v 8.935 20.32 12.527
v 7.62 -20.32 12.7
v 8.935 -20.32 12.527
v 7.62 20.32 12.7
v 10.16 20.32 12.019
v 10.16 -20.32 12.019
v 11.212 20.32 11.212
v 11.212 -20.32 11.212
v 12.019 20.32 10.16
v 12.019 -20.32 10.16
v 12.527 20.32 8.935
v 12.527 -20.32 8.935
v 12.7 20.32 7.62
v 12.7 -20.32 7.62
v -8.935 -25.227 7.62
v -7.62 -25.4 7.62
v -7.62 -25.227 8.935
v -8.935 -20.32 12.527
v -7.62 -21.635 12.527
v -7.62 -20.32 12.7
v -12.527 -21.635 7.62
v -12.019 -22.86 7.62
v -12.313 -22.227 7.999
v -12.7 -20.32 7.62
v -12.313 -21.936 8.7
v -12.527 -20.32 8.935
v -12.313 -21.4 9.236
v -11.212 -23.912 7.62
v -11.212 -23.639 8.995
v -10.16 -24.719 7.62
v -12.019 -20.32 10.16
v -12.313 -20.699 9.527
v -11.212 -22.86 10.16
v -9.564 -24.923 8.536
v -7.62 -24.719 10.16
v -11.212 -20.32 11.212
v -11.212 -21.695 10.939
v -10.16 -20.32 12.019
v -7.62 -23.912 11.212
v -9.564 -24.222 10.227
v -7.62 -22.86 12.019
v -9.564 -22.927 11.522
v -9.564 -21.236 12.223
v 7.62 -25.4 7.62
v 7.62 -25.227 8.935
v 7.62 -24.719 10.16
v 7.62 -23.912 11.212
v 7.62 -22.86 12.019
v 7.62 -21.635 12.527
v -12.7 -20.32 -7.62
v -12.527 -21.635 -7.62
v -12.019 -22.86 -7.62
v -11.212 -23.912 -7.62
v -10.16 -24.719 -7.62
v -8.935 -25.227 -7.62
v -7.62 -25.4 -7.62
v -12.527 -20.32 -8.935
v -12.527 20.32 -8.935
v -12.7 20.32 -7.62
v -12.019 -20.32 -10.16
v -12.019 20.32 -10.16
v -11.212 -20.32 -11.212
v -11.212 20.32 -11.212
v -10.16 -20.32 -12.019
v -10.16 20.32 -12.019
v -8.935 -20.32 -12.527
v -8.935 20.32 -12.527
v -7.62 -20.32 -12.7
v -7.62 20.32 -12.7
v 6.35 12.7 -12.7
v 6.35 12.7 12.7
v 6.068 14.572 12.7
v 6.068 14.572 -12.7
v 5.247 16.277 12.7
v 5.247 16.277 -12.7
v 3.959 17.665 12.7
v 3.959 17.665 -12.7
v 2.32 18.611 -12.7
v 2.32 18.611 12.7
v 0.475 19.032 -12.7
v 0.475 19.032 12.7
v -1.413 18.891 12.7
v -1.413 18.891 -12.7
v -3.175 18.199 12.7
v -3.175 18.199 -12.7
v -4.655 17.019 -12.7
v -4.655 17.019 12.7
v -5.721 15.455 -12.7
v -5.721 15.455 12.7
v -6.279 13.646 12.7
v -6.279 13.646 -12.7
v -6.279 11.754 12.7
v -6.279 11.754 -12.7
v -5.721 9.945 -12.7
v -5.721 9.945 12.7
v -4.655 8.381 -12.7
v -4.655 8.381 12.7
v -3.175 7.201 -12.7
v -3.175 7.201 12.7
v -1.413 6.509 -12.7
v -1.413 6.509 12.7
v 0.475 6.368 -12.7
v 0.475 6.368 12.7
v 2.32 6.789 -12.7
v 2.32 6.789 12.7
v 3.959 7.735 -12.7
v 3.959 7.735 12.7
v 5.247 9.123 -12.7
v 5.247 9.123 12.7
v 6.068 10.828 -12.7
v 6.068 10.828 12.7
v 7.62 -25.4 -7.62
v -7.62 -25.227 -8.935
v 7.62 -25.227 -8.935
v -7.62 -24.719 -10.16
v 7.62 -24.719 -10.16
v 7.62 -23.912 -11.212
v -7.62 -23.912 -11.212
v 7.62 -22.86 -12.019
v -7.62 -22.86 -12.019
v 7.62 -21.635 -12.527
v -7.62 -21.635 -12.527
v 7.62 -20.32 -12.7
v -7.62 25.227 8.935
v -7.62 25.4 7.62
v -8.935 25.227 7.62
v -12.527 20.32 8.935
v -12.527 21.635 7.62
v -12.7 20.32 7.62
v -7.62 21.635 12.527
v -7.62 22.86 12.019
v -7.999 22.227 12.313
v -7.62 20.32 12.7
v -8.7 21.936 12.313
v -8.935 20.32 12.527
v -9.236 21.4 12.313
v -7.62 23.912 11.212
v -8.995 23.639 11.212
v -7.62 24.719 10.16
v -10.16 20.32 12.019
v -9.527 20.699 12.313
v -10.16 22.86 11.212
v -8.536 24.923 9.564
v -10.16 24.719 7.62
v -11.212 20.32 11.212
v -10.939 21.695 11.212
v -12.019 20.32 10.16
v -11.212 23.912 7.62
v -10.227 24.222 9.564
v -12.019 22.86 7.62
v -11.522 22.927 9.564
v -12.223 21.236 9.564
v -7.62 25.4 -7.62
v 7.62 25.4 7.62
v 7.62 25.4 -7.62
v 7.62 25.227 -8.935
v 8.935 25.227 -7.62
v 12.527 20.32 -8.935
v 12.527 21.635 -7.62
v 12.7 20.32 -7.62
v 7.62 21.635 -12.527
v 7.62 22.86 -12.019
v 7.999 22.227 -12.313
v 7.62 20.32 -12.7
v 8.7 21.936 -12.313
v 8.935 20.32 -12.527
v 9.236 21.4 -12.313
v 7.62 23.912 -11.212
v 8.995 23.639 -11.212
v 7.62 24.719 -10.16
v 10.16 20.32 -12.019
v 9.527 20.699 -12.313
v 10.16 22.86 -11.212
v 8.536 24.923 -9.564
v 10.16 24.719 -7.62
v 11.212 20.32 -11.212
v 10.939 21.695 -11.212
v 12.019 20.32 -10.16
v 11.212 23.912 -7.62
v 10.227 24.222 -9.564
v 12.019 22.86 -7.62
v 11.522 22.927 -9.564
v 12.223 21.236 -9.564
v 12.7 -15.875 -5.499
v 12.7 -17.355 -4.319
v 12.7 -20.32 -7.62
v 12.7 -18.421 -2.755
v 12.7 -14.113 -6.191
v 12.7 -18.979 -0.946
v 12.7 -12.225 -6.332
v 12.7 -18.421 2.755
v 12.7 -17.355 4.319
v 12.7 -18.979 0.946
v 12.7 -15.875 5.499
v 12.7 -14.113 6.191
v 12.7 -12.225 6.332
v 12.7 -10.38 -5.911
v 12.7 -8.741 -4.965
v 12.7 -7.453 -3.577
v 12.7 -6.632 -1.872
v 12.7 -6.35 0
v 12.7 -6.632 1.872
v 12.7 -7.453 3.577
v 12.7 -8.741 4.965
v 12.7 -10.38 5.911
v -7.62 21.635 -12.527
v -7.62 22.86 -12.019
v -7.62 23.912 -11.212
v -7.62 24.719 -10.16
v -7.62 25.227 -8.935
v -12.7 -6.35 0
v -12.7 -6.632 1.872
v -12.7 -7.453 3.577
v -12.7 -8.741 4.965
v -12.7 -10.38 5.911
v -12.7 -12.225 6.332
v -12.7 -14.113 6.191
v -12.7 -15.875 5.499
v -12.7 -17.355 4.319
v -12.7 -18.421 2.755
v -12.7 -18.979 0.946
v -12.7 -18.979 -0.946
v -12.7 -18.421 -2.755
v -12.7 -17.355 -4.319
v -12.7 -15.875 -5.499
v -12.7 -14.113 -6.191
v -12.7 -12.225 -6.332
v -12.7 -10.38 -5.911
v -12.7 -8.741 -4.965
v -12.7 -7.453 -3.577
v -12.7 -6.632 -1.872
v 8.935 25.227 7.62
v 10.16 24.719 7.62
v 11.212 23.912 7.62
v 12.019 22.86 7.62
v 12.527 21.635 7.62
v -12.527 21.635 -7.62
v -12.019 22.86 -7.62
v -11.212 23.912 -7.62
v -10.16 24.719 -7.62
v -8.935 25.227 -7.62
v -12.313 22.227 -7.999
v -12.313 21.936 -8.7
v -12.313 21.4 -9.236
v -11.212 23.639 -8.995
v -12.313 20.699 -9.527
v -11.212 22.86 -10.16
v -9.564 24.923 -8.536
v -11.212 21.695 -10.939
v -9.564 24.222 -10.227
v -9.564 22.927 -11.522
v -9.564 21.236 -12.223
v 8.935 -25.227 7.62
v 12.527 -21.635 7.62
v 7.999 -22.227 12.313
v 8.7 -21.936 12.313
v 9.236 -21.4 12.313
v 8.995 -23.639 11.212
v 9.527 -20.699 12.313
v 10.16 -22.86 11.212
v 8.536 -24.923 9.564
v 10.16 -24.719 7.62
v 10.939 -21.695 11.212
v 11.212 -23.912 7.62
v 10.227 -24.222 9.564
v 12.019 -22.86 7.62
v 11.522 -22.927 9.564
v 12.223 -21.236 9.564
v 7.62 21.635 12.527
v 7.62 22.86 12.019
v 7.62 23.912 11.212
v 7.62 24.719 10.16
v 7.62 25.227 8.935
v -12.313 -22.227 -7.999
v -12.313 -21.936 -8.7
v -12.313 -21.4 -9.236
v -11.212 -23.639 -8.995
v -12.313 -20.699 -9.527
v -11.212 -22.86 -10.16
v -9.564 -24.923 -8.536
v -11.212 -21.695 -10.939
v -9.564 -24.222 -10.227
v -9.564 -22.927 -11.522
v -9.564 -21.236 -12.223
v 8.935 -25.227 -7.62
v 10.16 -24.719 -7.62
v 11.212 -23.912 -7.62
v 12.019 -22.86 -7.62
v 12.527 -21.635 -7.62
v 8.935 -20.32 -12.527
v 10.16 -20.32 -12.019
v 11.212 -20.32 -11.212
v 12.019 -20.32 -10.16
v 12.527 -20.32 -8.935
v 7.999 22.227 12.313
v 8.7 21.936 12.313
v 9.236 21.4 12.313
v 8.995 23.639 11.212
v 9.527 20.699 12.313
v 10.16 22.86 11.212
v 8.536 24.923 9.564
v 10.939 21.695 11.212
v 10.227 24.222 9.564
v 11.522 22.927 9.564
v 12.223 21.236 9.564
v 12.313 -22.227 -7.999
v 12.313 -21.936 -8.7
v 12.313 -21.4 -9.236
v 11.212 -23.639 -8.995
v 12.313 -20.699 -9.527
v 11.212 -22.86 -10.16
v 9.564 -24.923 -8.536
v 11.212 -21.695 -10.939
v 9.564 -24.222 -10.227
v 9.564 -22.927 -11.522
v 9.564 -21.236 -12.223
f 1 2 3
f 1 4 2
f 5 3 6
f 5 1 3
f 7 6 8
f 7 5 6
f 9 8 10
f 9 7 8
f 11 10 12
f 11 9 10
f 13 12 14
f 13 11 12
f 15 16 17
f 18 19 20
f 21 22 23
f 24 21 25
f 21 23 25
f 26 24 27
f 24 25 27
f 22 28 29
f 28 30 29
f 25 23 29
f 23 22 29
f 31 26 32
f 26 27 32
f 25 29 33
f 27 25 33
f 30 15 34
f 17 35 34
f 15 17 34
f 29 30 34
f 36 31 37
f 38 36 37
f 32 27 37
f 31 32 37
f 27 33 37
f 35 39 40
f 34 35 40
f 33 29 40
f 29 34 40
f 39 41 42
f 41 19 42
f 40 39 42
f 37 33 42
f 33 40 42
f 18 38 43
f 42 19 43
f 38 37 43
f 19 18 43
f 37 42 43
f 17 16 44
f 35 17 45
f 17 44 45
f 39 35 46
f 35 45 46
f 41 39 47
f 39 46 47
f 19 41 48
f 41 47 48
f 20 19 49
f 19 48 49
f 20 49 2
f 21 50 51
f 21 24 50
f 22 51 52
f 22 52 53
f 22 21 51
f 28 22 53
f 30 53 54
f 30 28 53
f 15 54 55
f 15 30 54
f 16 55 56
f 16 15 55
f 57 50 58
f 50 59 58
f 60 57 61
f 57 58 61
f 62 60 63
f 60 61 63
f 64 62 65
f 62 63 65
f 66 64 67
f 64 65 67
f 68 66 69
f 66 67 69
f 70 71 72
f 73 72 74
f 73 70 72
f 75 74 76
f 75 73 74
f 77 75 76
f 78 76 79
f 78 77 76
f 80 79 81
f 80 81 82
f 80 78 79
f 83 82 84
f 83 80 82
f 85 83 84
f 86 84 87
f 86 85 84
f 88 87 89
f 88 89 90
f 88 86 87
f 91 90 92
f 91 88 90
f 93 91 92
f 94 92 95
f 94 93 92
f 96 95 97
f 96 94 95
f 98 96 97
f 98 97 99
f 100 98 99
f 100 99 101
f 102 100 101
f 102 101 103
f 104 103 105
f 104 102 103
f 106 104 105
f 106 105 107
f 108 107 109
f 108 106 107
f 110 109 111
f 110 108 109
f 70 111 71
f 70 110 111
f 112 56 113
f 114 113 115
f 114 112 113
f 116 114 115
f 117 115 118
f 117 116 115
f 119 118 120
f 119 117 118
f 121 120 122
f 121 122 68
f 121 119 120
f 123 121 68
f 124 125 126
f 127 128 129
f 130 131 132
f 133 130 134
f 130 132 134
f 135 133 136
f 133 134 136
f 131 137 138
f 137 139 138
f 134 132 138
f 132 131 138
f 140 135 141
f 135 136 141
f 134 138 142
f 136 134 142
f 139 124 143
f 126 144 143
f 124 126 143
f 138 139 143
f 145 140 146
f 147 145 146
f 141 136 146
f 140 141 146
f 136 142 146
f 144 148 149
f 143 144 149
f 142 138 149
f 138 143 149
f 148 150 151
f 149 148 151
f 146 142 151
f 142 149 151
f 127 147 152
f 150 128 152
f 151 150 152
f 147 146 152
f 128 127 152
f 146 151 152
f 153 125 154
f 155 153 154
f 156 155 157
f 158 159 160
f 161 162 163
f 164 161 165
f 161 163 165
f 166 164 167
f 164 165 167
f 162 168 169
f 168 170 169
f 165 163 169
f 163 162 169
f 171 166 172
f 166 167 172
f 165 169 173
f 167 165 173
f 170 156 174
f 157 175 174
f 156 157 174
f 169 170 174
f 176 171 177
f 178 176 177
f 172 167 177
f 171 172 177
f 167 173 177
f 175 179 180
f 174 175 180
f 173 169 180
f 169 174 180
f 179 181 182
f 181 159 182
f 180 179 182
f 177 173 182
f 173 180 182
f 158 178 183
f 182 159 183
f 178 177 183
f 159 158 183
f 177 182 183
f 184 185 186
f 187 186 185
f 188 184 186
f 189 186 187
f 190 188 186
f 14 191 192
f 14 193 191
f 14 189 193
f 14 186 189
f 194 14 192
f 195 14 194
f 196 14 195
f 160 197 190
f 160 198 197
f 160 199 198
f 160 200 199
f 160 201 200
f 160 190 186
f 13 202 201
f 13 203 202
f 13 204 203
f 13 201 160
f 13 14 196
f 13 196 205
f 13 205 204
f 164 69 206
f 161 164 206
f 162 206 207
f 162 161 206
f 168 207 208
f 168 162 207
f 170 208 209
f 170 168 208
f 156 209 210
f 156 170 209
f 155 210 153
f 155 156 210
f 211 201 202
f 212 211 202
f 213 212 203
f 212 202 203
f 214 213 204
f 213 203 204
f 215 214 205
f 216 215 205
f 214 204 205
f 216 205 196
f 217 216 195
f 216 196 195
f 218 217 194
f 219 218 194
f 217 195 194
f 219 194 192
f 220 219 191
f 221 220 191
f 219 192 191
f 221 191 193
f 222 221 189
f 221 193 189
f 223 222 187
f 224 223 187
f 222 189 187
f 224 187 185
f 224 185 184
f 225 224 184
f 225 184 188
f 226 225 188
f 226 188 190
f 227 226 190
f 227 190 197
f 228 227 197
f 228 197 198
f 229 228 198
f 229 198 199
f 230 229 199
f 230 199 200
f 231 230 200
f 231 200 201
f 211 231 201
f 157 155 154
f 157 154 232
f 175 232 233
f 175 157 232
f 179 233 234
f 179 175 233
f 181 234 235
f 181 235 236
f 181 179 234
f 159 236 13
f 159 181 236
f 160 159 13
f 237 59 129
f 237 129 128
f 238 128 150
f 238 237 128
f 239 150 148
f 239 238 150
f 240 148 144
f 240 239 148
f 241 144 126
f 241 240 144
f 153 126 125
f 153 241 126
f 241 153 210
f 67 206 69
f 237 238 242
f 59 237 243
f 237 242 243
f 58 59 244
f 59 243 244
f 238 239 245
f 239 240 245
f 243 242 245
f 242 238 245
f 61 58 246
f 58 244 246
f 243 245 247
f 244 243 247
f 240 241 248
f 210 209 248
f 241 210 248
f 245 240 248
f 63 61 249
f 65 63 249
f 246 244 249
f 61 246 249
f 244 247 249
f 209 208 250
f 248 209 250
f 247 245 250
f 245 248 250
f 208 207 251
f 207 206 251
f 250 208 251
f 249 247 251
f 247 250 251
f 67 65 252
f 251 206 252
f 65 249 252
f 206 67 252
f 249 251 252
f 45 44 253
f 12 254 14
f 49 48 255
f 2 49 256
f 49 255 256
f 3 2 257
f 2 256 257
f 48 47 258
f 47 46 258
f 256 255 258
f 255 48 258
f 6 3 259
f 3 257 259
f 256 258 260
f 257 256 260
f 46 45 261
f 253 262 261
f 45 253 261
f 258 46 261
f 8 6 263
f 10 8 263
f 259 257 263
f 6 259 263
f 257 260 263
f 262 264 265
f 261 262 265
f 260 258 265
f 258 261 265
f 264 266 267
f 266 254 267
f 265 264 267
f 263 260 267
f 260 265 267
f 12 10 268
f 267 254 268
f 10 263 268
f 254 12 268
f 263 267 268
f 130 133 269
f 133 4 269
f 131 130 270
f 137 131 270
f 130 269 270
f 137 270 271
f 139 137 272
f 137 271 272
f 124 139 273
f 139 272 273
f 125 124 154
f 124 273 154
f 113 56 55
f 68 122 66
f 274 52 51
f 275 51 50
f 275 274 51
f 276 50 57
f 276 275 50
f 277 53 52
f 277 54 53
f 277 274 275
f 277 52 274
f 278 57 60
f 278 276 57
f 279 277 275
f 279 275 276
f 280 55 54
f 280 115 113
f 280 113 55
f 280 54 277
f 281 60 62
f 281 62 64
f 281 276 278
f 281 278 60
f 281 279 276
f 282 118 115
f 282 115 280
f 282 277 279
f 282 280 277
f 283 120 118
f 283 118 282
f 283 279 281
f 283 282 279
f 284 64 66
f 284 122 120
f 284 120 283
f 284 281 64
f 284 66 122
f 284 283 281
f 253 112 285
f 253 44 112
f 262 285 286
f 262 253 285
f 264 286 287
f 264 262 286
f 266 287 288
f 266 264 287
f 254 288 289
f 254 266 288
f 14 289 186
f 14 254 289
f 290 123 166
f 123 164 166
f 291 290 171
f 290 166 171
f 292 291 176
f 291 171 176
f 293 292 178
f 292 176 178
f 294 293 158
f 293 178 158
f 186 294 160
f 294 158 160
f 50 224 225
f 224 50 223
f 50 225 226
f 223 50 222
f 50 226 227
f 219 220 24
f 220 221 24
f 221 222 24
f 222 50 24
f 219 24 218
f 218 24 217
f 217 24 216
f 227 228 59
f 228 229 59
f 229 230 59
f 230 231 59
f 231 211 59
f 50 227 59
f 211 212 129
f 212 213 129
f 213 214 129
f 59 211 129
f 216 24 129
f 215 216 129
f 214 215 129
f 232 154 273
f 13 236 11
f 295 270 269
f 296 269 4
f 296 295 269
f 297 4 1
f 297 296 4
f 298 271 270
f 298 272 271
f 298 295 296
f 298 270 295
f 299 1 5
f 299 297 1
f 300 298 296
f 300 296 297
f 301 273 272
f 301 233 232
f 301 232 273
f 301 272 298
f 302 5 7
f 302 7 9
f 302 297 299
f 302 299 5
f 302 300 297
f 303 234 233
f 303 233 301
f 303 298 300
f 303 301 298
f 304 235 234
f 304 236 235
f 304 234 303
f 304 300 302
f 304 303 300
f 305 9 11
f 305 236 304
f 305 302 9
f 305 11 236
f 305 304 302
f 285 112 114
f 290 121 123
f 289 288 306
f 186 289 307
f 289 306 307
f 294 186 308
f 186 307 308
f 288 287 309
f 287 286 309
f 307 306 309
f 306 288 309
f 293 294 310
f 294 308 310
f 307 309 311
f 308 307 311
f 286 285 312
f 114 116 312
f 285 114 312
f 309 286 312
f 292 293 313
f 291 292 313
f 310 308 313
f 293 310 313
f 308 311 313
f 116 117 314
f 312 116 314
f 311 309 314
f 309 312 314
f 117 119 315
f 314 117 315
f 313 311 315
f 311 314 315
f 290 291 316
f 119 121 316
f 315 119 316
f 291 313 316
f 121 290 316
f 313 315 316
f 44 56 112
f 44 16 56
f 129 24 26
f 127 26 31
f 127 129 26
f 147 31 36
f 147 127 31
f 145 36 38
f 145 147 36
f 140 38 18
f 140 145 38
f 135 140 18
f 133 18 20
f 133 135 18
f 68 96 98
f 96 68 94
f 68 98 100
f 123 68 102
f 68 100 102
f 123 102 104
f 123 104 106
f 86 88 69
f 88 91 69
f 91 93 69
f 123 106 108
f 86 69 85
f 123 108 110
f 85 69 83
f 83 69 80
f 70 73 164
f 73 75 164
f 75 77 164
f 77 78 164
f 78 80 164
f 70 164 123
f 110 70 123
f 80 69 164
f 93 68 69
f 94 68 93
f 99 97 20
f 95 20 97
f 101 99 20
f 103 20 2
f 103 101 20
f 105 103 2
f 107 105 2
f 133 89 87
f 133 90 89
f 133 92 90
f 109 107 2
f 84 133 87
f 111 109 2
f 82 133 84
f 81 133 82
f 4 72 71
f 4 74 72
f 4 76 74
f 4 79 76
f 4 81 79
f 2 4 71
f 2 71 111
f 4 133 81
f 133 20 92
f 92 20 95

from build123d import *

# Parameters (mm, degrees)
F0_W     = 25.4
F0_H     = 50.8
F0_R     = 6.35
F1_DEPTH = 12.7
F3_D     = 12.7
F4_R     = 5.08


with BuildPart() as f1:
    # F0 (on Top) → F1 (new body, symmetric)
    with BuildSketch(Plane.XY):
        Rectangle(F0_W, F0_H)
        with Locations((0, 12.7)):
            Circle(F0_R, mode=Mode.SUBTRACT)
    extrude(amount=F1_DEPTH, both=True)

    # F3 (through all)
    with Locations(Plane(origin=(-12.7, 0, 0), x_dir=(0, -1, 0), z_dir=(-1, 0, 0))):
        with Locations((12.7, 0)):
            Hole(F3_D / 2)

    # F4
    f4_edges = [f1.edges().sort_by_distance(p)[0] for p in [
        (0, -25.4, -12.7),
        (12.7, -25.4, 0),
        (0, -25.4, 12.7),
        (-12.7, -25.4, 0),
        (12.7, 25.4, 0),
        (0, 25.4, -12.7),
        (-12.7, 25.4, 0),
        (0, 25.4, 12.7),
        (-12.7, 0, -12.7),
        (12.7, 0, -12.7),
        (12.7, 0, 12.7),
        (-12.7, 0, 12.7),
    ]]
    fillet(f4_edges, radius=F4_R)


solid = f1.part
